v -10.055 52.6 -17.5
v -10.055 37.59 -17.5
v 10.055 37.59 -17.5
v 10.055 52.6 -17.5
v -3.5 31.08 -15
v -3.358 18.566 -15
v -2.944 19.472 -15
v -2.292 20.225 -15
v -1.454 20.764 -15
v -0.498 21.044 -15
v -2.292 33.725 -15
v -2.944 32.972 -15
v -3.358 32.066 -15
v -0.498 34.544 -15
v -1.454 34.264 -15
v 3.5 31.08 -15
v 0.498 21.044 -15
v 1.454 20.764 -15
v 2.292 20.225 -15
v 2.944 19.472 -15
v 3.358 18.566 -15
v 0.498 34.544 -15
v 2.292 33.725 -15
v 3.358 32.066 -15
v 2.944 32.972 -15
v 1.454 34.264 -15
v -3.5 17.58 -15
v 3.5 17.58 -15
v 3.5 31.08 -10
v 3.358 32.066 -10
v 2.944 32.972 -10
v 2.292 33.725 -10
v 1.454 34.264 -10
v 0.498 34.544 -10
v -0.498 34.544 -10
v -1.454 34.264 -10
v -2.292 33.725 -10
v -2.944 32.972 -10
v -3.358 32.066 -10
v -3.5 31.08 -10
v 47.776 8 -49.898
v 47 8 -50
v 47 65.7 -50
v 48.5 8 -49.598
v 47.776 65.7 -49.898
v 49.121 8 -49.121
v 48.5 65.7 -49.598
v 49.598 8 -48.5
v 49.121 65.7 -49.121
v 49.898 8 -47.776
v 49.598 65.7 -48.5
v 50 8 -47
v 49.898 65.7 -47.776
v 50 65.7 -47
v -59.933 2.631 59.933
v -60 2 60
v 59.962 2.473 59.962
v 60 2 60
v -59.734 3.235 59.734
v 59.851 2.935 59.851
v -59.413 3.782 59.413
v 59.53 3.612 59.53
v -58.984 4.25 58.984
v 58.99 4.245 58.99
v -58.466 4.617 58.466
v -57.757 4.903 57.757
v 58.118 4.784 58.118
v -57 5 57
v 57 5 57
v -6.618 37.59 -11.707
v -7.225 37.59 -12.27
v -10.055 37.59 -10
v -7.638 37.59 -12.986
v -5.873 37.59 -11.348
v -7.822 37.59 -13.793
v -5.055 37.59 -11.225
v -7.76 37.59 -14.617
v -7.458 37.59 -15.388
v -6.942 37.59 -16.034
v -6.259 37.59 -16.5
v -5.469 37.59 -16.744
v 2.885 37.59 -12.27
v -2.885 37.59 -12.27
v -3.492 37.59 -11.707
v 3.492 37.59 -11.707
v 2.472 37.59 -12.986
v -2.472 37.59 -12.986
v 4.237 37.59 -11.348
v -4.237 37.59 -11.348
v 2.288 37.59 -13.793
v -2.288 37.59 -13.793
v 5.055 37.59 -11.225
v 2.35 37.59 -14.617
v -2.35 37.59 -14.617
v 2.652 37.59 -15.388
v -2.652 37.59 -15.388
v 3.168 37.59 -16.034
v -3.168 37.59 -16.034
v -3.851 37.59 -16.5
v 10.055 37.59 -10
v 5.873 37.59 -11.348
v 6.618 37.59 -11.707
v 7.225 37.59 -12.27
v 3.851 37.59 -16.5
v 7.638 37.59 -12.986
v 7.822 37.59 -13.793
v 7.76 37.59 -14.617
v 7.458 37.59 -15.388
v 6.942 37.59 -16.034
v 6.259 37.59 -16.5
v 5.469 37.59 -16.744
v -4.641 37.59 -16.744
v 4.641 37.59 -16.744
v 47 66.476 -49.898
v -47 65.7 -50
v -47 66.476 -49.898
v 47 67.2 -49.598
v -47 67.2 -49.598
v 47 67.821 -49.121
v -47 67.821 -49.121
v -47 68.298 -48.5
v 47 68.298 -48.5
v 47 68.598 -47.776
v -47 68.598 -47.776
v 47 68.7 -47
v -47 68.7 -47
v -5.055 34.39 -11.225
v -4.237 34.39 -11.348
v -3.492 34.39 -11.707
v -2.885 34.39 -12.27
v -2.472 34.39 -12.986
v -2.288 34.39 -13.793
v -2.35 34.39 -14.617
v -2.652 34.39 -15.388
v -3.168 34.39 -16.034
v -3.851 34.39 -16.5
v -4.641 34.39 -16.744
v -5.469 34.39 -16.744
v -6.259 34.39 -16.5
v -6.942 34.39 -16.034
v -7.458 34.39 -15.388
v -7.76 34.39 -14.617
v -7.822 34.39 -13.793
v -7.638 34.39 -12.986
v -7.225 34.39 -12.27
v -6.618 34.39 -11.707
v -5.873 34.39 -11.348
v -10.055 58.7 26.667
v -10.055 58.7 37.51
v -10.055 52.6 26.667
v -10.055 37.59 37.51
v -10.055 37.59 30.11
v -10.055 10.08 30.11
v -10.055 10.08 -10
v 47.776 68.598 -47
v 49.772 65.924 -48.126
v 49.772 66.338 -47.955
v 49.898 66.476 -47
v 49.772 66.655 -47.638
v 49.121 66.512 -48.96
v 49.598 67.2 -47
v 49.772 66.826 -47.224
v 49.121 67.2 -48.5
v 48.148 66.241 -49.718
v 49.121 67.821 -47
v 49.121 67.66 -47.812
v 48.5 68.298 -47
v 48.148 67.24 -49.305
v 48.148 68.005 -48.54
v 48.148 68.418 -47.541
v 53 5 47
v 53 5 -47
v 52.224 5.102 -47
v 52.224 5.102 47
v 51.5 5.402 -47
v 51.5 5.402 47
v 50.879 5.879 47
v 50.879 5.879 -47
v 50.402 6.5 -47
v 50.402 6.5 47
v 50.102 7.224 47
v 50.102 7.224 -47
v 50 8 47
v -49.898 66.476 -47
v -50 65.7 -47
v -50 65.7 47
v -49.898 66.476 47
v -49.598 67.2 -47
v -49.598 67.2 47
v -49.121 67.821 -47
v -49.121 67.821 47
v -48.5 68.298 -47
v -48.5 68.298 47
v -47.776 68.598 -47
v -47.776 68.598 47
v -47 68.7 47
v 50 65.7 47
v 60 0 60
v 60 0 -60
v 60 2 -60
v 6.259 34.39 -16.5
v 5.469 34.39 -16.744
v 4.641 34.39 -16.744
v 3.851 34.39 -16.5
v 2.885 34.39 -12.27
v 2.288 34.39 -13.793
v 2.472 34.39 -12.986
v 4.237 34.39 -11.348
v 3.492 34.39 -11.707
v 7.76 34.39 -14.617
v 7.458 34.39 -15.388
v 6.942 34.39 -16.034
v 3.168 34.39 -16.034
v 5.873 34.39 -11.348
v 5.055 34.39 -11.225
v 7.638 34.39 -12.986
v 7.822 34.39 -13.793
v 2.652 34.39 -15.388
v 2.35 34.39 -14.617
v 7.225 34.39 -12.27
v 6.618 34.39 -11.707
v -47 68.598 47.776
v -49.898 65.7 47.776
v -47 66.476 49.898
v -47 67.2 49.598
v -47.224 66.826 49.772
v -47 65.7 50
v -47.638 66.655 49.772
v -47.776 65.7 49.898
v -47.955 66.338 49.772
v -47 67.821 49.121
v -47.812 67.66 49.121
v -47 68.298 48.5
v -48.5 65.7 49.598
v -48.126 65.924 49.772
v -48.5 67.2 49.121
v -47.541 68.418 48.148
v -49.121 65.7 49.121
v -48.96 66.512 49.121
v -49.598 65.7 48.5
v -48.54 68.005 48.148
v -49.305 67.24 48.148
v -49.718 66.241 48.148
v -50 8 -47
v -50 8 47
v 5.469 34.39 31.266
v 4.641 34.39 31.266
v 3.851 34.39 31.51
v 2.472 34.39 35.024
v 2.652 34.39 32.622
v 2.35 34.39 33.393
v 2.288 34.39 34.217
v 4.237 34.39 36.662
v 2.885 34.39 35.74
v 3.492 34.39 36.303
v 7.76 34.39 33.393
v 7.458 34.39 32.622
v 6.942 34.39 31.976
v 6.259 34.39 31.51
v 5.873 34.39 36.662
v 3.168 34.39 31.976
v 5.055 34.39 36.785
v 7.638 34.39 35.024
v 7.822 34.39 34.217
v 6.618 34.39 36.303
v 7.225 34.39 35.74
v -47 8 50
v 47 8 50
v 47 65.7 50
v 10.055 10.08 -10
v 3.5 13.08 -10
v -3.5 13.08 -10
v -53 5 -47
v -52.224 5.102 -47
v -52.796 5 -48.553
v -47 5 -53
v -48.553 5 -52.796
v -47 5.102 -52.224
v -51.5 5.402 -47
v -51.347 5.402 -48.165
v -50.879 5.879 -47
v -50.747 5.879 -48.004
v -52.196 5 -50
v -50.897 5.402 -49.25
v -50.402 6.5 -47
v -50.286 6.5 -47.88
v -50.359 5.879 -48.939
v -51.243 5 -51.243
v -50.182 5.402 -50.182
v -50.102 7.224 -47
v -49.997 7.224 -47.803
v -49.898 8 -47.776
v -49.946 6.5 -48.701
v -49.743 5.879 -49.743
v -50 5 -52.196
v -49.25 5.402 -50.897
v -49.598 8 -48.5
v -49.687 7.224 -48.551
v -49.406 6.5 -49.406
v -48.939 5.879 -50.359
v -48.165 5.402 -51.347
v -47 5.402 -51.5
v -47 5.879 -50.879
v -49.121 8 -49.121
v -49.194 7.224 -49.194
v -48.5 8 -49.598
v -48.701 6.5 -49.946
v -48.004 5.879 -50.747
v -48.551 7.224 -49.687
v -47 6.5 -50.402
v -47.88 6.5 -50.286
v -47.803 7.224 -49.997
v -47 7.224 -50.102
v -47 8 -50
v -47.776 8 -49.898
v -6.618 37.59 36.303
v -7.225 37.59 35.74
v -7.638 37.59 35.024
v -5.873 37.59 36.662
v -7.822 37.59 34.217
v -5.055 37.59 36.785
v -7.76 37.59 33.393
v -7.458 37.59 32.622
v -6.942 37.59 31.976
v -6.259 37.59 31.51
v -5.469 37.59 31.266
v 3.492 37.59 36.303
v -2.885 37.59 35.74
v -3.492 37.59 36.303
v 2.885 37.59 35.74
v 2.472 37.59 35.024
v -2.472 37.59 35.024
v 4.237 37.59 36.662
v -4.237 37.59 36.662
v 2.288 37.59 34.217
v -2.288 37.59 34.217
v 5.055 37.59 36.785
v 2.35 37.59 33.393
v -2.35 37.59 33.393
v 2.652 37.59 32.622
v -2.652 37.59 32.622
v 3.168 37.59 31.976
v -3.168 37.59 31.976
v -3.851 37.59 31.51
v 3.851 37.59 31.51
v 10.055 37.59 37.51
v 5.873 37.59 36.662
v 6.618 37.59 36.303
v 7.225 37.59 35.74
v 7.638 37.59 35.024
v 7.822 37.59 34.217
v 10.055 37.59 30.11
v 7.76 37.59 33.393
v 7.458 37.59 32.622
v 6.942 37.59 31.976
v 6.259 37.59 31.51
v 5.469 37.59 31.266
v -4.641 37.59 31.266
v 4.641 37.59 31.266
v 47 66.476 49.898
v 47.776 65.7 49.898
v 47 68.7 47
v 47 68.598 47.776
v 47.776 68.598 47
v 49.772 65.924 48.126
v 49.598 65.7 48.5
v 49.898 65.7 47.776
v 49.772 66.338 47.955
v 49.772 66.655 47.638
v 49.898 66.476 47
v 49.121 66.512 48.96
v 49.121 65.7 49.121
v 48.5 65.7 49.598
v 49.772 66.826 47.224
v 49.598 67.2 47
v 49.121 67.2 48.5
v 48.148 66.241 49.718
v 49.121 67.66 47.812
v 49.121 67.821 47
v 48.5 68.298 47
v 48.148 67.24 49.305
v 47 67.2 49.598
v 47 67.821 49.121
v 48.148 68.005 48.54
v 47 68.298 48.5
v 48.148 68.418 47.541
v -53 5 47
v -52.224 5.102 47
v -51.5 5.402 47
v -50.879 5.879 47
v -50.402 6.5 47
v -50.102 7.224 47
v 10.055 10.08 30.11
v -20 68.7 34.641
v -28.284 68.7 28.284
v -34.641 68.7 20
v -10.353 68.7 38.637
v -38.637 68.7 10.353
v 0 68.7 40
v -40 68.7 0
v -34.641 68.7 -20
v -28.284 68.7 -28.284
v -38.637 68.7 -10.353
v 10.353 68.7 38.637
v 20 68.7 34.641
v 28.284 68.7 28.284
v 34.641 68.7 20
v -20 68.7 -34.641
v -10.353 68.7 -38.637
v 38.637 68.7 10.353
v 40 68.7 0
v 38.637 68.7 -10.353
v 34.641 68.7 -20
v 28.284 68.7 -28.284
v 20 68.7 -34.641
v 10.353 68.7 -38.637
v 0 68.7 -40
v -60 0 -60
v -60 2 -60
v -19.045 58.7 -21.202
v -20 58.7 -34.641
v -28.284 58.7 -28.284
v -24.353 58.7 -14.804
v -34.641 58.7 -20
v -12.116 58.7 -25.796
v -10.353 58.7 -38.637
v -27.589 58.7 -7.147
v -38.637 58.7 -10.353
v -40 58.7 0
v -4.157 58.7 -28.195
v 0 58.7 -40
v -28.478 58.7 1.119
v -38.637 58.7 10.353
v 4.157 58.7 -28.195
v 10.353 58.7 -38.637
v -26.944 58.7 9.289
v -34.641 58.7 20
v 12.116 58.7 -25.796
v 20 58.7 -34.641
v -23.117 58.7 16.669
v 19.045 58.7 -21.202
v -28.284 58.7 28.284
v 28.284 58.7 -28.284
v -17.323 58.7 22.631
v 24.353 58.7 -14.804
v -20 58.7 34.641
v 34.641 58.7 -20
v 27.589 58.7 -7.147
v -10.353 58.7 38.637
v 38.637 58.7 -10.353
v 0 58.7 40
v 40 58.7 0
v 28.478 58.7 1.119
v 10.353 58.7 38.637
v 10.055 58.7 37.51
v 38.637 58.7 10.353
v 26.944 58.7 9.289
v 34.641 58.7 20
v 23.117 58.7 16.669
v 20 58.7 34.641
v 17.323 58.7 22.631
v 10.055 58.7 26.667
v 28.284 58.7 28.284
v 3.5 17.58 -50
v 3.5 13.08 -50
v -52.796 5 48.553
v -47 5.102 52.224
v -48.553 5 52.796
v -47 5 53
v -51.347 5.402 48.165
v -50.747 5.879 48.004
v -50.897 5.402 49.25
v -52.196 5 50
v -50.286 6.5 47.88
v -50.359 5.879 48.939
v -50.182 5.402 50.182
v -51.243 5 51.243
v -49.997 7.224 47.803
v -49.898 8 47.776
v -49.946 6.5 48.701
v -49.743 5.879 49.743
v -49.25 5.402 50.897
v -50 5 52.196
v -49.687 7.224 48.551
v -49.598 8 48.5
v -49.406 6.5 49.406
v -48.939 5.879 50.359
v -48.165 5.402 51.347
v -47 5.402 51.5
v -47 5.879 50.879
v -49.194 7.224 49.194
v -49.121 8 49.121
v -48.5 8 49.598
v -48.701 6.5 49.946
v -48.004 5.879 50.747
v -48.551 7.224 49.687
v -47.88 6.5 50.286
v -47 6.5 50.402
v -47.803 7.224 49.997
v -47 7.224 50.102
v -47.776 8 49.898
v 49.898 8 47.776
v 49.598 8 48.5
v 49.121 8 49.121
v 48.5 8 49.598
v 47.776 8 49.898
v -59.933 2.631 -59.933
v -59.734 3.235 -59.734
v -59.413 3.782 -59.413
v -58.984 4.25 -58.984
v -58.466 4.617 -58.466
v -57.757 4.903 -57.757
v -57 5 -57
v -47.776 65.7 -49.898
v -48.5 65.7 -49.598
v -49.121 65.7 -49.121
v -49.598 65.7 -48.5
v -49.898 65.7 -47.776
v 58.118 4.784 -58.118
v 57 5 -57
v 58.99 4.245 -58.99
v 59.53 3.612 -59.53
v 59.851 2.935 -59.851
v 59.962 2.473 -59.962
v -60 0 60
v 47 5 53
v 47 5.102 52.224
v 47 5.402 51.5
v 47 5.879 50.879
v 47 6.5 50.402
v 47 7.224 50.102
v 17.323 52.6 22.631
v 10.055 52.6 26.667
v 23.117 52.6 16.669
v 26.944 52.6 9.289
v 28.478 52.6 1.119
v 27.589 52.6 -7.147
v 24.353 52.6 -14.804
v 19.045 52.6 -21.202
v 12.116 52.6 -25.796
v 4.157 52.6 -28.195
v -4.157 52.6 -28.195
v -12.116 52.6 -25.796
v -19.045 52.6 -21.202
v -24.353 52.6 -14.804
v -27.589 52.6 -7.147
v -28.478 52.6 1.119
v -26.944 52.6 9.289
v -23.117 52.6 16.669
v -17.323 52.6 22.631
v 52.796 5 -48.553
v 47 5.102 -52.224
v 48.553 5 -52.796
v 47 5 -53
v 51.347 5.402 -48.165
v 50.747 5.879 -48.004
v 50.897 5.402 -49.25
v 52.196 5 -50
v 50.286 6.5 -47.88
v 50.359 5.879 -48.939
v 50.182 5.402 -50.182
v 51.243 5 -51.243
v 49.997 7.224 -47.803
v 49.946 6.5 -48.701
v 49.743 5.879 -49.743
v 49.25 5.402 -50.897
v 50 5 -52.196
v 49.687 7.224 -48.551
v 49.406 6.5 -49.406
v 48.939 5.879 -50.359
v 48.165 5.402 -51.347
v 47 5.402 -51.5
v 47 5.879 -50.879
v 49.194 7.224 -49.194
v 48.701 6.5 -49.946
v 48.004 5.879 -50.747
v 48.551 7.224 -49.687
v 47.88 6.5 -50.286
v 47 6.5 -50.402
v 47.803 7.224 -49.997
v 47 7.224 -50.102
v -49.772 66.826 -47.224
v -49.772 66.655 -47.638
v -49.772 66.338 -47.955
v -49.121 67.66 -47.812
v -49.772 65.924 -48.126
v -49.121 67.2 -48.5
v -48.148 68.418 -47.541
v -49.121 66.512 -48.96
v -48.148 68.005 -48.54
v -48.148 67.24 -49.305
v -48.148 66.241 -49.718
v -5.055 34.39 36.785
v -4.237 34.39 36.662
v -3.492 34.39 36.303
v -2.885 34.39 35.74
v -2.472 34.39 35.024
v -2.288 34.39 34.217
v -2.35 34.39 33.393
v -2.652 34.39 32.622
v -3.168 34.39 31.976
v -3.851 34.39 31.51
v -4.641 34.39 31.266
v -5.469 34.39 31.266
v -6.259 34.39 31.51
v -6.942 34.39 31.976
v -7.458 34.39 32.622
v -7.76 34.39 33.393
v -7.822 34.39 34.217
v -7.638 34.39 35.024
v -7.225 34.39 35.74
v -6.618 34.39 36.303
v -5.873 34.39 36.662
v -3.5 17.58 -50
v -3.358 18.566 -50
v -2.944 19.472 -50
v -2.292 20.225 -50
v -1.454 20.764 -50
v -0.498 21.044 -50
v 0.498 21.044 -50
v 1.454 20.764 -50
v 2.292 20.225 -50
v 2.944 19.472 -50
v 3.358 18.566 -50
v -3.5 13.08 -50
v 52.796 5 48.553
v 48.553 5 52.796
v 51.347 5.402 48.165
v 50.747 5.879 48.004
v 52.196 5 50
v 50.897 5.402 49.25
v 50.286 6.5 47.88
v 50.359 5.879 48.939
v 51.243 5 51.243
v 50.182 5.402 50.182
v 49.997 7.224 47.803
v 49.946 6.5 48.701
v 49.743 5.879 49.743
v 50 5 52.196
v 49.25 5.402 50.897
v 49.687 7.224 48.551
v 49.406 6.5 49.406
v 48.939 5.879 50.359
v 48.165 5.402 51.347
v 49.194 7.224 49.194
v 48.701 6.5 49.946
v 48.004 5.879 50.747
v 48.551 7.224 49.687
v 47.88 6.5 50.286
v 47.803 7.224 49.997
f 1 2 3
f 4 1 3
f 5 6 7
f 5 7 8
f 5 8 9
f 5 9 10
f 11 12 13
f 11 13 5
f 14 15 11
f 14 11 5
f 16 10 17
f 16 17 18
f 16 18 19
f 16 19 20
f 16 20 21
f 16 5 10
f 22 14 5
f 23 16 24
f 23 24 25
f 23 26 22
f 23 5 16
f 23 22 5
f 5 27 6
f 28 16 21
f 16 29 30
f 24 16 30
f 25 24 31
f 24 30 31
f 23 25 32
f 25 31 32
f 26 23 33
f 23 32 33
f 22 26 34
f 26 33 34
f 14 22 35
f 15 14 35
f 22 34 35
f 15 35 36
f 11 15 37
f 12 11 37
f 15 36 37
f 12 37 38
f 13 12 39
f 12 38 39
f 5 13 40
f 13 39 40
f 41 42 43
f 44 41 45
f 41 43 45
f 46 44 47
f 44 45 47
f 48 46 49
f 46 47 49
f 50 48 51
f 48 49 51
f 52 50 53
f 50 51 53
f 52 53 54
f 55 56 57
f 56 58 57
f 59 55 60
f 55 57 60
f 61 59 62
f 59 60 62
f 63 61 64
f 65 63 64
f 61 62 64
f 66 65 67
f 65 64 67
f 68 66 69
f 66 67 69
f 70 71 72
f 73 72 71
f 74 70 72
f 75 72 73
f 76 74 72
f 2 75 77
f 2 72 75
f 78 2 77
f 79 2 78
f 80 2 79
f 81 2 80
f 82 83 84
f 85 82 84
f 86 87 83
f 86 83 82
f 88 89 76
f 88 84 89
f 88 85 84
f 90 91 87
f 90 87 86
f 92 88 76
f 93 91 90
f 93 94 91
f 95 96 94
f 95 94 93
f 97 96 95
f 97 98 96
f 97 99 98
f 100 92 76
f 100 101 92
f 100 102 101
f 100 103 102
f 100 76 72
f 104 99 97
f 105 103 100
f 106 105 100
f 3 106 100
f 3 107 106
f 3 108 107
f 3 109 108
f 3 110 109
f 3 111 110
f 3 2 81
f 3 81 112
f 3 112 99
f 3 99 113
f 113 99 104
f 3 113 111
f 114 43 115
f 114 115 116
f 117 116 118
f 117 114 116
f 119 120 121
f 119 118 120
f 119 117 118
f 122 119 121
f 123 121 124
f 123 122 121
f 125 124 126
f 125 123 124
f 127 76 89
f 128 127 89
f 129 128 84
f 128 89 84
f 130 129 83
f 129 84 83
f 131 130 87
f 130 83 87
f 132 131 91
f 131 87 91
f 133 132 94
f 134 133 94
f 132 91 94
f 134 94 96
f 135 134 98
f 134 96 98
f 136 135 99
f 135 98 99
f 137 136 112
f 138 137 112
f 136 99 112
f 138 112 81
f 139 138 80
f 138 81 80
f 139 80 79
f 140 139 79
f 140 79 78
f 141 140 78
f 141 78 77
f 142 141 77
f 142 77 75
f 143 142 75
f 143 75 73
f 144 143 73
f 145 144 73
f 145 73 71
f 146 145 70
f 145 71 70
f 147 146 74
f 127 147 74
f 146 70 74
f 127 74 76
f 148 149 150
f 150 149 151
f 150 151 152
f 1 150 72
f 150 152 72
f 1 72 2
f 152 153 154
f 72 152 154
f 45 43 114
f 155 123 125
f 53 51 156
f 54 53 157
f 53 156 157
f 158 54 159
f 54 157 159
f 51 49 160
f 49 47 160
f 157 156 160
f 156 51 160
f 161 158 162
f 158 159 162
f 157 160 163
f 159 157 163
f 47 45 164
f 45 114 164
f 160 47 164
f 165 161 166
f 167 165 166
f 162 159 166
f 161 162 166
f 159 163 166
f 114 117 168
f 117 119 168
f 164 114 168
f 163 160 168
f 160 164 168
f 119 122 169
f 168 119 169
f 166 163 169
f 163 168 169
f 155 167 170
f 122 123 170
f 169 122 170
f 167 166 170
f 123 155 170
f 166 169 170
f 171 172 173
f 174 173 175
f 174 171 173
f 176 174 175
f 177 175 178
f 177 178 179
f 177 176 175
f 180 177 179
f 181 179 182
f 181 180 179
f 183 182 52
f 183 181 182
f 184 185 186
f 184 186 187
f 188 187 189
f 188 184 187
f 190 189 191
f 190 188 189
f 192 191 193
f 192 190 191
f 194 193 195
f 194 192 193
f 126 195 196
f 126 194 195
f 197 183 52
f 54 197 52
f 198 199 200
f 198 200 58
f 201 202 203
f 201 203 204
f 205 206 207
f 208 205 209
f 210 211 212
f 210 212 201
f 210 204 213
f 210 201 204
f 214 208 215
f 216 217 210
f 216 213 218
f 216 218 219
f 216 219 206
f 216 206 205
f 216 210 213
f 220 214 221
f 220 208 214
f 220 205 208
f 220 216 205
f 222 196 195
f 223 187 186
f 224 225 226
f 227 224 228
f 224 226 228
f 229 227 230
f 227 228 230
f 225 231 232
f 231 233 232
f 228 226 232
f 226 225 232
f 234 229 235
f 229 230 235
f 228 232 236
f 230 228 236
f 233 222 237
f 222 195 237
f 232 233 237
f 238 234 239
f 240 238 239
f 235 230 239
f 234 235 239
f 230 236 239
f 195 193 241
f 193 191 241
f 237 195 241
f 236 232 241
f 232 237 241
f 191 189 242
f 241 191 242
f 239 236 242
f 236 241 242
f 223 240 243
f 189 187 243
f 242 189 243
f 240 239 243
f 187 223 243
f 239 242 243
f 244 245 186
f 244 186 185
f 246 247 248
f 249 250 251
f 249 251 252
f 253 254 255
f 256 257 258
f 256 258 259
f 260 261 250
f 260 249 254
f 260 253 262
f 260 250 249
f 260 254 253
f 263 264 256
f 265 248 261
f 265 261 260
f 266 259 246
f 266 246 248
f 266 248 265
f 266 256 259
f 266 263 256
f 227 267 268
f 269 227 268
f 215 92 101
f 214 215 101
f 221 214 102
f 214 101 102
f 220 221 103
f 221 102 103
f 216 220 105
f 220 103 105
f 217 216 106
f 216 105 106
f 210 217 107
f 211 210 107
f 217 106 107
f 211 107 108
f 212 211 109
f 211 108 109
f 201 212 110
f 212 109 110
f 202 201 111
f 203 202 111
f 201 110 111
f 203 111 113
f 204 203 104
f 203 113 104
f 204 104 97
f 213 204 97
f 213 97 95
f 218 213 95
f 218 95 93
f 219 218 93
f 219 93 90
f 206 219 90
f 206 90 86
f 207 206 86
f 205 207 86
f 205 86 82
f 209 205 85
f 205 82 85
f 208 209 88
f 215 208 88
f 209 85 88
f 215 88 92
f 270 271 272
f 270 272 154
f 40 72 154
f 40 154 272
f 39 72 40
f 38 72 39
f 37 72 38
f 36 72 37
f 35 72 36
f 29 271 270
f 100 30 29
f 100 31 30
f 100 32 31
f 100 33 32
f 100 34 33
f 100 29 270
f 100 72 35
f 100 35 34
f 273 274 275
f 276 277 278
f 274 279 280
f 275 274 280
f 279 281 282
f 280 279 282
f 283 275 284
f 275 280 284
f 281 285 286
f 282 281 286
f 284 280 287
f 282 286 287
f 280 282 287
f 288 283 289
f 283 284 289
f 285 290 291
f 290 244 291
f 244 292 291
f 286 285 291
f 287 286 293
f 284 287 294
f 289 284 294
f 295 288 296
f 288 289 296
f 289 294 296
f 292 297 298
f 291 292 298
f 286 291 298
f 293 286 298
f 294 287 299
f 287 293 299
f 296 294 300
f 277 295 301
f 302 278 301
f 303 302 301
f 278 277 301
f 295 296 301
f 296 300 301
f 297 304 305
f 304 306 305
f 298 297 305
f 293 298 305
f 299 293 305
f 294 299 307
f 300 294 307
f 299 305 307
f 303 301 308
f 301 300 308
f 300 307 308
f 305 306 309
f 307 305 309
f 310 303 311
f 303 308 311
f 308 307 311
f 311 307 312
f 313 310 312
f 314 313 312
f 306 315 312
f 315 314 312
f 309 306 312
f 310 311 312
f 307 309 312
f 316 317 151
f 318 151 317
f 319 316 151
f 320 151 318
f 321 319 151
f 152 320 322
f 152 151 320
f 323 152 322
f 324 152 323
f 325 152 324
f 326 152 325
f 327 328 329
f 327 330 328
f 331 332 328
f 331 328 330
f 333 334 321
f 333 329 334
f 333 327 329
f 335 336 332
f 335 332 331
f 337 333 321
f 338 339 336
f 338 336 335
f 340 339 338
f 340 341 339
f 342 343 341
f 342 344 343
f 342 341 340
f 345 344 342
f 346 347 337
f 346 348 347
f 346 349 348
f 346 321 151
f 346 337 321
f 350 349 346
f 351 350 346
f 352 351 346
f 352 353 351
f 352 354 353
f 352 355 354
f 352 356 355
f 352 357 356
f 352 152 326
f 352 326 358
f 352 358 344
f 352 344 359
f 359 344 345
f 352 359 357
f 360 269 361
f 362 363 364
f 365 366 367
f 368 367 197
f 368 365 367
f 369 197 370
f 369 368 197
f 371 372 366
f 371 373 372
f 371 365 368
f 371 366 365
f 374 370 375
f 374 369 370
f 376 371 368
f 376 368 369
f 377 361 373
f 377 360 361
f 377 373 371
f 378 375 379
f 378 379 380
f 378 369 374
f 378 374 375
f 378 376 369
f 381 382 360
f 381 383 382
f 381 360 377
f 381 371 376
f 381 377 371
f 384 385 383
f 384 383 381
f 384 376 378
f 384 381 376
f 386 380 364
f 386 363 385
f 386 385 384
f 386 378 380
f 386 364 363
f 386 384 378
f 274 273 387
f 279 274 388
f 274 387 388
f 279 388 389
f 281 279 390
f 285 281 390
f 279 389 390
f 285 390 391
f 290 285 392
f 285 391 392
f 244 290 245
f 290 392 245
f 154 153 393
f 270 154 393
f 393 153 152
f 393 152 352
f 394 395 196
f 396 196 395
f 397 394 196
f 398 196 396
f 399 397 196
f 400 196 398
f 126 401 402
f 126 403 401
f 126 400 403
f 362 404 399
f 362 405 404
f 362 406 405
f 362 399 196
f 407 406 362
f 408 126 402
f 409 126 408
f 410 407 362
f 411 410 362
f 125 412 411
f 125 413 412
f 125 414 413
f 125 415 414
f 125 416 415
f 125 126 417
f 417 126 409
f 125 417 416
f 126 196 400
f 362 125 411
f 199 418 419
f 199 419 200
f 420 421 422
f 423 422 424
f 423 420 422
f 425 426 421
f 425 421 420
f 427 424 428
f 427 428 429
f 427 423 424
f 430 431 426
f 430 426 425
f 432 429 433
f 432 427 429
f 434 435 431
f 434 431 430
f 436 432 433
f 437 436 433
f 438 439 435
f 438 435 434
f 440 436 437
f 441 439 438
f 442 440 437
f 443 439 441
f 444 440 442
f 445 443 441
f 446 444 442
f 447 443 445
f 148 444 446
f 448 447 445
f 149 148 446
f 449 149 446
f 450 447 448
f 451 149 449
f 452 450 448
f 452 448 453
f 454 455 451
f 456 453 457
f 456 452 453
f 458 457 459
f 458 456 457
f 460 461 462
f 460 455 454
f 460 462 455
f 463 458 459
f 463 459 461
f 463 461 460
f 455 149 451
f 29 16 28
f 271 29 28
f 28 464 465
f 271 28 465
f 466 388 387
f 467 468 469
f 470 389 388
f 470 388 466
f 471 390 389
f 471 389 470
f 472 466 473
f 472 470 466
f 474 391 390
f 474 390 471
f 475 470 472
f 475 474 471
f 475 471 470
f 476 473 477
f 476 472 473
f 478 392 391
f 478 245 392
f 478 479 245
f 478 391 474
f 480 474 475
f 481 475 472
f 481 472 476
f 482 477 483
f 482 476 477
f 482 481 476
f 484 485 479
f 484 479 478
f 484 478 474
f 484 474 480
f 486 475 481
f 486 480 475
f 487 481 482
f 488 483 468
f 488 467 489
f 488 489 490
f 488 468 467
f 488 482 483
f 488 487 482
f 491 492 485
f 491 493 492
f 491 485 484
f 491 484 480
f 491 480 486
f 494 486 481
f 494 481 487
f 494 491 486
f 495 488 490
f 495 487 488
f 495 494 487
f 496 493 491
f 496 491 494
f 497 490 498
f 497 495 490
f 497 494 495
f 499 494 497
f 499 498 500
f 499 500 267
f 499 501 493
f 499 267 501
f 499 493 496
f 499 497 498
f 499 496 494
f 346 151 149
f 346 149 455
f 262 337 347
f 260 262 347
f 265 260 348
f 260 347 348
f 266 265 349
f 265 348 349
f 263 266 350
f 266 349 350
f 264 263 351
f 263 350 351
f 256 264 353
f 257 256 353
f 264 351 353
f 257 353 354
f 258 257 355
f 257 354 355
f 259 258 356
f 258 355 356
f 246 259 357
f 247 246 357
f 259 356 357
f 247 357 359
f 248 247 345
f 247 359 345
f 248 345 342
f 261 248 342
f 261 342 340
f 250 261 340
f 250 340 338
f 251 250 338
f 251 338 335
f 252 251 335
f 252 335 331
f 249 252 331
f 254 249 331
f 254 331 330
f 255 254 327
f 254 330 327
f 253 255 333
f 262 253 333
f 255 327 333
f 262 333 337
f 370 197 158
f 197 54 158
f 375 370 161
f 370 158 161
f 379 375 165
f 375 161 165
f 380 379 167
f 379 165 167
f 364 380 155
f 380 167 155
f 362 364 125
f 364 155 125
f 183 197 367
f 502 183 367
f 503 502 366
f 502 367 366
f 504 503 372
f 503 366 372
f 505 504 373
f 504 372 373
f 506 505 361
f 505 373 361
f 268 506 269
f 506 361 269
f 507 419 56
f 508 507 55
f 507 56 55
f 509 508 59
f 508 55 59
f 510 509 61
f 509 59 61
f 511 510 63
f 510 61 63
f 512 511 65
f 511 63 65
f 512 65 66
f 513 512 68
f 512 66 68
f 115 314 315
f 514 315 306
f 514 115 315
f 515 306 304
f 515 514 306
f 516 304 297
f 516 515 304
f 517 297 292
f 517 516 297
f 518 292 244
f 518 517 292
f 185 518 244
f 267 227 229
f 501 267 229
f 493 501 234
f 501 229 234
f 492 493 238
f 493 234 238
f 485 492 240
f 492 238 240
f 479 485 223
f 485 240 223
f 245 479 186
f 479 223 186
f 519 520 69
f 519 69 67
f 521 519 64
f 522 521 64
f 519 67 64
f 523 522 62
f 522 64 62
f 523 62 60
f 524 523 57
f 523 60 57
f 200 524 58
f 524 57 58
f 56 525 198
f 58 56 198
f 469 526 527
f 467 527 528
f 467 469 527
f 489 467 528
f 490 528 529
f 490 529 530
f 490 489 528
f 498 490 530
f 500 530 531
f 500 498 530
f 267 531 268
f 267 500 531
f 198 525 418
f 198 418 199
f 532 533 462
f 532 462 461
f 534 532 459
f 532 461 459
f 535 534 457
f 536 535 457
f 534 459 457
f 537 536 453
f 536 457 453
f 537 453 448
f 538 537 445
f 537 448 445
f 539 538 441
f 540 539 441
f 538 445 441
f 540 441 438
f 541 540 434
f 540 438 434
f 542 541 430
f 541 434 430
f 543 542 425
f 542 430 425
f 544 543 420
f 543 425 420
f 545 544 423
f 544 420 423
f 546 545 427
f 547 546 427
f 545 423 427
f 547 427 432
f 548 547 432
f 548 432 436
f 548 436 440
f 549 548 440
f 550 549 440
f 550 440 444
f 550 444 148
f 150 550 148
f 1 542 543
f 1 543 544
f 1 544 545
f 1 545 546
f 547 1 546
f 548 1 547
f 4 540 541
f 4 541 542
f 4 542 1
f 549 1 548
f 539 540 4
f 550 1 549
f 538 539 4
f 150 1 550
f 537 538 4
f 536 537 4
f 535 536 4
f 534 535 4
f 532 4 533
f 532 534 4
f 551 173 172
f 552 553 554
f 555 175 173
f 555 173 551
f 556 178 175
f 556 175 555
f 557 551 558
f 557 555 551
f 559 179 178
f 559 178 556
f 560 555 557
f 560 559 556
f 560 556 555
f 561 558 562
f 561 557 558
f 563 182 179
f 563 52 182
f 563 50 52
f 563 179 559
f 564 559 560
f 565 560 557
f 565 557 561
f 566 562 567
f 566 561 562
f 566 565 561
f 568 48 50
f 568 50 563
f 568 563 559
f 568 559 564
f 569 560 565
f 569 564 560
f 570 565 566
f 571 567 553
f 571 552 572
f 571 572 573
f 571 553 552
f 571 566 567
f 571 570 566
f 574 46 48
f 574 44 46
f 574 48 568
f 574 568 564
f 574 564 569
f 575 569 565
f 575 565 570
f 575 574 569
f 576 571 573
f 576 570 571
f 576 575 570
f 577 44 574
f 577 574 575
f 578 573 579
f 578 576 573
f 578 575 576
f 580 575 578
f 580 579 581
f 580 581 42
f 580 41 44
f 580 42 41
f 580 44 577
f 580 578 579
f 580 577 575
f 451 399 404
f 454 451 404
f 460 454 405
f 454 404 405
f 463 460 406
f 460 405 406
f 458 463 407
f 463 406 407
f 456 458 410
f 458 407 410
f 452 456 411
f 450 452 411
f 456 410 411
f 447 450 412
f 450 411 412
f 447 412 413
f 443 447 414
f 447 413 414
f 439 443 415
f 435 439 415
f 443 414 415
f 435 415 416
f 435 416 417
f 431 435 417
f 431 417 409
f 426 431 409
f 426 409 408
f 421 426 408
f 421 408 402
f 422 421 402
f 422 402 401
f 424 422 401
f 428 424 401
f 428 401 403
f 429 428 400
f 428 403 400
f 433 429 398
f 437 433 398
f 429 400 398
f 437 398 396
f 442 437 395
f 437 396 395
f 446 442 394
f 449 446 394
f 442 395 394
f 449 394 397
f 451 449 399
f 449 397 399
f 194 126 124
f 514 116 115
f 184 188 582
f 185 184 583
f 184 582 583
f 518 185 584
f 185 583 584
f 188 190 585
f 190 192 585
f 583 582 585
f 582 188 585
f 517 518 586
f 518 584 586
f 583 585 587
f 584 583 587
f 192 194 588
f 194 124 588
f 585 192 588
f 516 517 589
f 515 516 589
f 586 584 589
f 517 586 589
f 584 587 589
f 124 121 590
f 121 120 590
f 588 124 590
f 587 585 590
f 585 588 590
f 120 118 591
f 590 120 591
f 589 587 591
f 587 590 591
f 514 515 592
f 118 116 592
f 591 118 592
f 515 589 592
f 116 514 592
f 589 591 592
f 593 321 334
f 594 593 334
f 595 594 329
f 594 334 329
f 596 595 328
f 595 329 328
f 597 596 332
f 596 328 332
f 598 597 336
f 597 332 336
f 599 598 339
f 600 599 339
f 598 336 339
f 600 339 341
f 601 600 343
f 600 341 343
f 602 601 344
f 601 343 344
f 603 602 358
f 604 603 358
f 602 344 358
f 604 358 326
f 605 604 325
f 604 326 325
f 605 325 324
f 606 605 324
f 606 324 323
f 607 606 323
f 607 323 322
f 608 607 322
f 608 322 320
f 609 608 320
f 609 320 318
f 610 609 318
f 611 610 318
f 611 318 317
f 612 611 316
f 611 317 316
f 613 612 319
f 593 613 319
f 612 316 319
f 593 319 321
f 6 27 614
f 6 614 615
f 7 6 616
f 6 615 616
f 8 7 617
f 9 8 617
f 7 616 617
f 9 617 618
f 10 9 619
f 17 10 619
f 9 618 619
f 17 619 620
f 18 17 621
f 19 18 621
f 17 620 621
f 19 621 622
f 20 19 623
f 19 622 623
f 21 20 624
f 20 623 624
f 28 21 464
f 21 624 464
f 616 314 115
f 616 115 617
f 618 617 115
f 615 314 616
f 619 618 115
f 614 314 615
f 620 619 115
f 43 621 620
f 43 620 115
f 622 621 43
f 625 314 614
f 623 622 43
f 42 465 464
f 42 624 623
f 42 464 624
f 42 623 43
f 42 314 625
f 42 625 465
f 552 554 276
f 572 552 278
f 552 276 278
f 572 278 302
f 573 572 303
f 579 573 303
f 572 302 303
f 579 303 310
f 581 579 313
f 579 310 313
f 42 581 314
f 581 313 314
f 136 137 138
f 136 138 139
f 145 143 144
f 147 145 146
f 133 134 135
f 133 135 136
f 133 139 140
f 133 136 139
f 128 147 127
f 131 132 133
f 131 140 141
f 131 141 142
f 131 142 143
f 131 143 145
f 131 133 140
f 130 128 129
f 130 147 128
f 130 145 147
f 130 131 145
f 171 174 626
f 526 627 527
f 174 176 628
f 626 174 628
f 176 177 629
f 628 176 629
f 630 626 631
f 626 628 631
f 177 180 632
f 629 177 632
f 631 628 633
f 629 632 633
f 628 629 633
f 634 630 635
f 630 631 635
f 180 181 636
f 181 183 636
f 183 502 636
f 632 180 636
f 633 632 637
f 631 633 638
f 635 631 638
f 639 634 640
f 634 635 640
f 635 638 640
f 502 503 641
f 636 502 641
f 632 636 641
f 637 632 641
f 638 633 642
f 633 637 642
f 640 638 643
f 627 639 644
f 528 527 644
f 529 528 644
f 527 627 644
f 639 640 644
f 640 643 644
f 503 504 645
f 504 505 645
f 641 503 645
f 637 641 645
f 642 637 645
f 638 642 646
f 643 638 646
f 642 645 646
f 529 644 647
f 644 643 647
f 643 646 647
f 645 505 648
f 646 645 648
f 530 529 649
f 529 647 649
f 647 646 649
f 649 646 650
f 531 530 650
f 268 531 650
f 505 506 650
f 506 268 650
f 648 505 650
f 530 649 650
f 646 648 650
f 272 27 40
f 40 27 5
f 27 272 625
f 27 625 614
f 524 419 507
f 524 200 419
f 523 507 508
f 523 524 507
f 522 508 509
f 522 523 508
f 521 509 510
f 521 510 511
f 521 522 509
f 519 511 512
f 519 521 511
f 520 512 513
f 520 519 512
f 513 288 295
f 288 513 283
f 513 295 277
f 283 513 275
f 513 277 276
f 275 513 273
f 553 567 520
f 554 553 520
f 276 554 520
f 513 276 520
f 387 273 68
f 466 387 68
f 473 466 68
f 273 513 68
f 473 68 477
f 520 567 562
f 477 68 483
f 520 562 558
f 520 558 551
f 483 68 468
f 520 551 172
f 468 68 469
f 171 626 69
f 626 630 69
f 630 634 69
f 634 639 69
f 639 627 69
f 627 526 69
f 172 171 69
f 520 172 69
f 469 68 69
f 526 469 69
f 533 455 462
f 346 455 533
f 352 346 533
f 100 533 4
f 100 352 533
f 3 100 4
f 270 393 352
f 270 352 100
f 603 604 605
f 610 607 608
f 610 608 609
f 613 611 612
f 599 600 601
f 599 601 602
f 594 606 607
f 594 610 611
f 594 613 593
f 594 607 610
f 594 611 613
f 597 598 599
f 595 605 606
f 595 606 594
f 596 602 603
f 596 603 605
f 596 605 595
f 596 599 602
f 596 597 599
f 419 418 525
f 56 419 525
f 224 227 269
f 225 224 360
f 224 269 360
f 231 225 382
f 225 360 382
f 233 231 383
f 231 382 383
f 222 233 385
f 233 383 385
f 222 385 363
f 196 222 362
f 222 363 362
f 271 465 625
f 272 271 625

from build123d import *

# Parameters (mm, degrees)
SKETCH1_W               = 100
SKETCH1_H               = 100
BOSS_EXTRUDE1_DEPTH     = 68.7
SKETCH2_R               = 40
CUT_EXTRUDE1_DEPTH      = 10
SKETCH3_R               = 28.5
CUT_EXTRUDE2_DEPTH      = 6.1
CUT_EXTRUDE3_DEPTH      = 89.129223303
CUT_EXTRUDE3_DEPTH_BACK = 15.01
SKETCH4_W               = 20.11
SKETCH4_H               = 55.01
SKETCH5_W               = 20.11
SKETCH5_H               = 40.11
CUT_EXTRUDE4_DEPTH      = 27.51
CUT_EXTRUDE5_REACH      = 133.224
SKETCH7_R               = 2.775
CUT_EXTRUDE6_DEPTH      = 3.2
CUT_EXTRUDE7_DEPTH      = 5
SKETCH9_W               = 120
SKETCH9_H               = 120
BOSS_EXTRUDE2_DEPTH     = 5
FILLET2_R               = 3


with BuildPart() as part:
    # Sketch1 → Boss-Extrude1 (new body)
    with BuildSketch(Plane(origin=(0, 0, 0), x_dir=(1, 0, 0), z_dir=(0, 1, 0))):
        Rectangle(SKETCH1_W, SKETCH1_H)
    extrude(amount=BOSS_EXTRUDE1_DEPTH)

    # Sketch2 → Cut-Extrude1 (cut)
    with BuildSketch(Plane(origin=(0, 68.7, 0), x_dir=(1, 0, 0), z_dir=(0, 1, 0))):
        with Locations(Location((0, 0, 0), (0, 0, 270))):
            Circle(SKETCH2_R)
    extrude(amount=-CUT_EXTRUDE1_DEPTH, mode=Mode.SUBTRACT)

    # Sketch3 → Cut-Extrude2 (cut)
    with BuildSketch(Plane(origin=(0, 58.7, 0), x_dir=(1, 0, 0), z_dir=(0, 1, 0))):
        with Locations(Location((0, 0, 0), (0, 0, 270))):
            Circle(SKETCH3_R)
    extrude(amount=-CUT_EXTRUDE2_DEPTH, mode=Mode.SUBTRACT)

    # Sketch4 → Cut-Extrude3 (cut, two sides: drawn at the far end of the back side and taken through both)
    with BuildSketch(Plane(origin=(0, 52.6, 0), x_dir=(1, 0, 0), z_dir=(0, 1, 0)).offset(-CUT_EXTRUDE3_DEPTH_BACK)):
        with Locations((0, -10.005)):
            Rectangle(SKETCH4_W, SKETCH4_H)
    extrude(amount=CUT_EXTRUDE3_DEPTH + CUT_EXTRUDE3_DEPTH_BACK, mode=Mode.SUBTRACT)

    # Sketch5 → Cut-Extrude4 (cut)
    with BuildSketch(Plane(origin=(0, 37.59, 0), x_dir=(1, 0, 0), z_dir=(0, 1, 0))):
        with Locations((0, -10.055)):
            Rectangle(SKETCH5_W, SKETCH5_H)
    extrude(amount=-CUT_EXTRUDE4_DEPTH, mode=Mode.SUBTRACT)

    # Sketch6 → Cut-Extrude5 (cut, up to next)
    with BuildSketch(Plane(origin=(0, 0, -50), x_dir=(-1, 0, 0), z_dir=(0, 0, -1)), mode=Mode.PRIVATE) as cut_extrude5_sk1:
        with BuildLine():
            Line((-3.5, 13.08), (3.5, 13.08))
            Line((3.5, 13.08), (3.5, 17.58))
            ThreePointArc((3.5, 17.58), (0, 21.08), (-3.5, 17.58))
            Line((-3.5, 17.58), (-3.5, 13.08))
        make_face()
    cut_extrude5_tool1 = extrude(cut_extrude5_sk1.sketch, amount=-CUT_EXTRUDE5_REACH, mode=Mode.PRIVATE) & part.part
    add(cut_extrude5_tool1.solids().sort_by_distance((0, 16.746539, -50))[0], mode=Mode.SUBTRACT)

    # Sketch7 → Cut-Extrude6 (cut)
    with BuildSketch(Plane(origin=(0, 37.59, 0), x_dir=(1, 0, 0), z_dir=(0, 1, 0))):
        with Locations(Location((5.055, -34.01, 0), (0, 0, 270))):
            Circle(SKETCH7_R)
        with Locations(Location((-5.055, -34.01, 0), (0, 0, 270))):
            Circle(SKETCH7_R)
        with Locations(Location((-5.055, 14, 0), (0, 0, 270))):
            Circle(SKETCH7_R)
        with Locations(Location((5.055, 14, 0), (0, 0, 270))):
            Circle(SKETCH7_R)
    extrude(amount=-CUT_EXTRUDE6_DEPTH, mode=Mode.SUBTRACT)

    # Sketch8 → Cut-Extrude7 (cut)
    with BuildSketch(Plane.XY.offset(-10)):
        with BuildLine():
            Line((-3.5, 13.08), (3.5, 13.08))
            Line((3.5, 13.08), (3.5, 31.08))
            ThreePointArc((3.5, 31.08), (0, 34.58), (-3.5, 31.08))
            Line((-3.5, 31.08), (-3.5, 13.08))
        make_face()
    extrude(amount=-CUT_EXTRUDE7_DEPTH, mode=Mode.SUBTRACT)

    # Sketch9 → Boss-Extrude2 (add)
    with BuildSketch(Plane.XZ):
        Rectangle(SKETCH9_W, SKETCH9_H)
    extrude(amount=-BOSS_EXTRUDE2_DEPTH)

    # Fillet2
    fillet2_edges = [part.edges().sort_by_distance(p)[0] for p in [
        (-50, 5, 0),
        (50, 5, 0),
        (0, 5, 50),
        (60, 5, 0),
        (0, 5, -60),
        (-60, 5, 0),
        (0, 5, 60),
        (0, 5, -50),
        (0, 68.7, -50),
        (-50, 68.7, 0),
        (0, 68.7, 50),
        (-50, 36.85, 50),
        (-50, 36.85, -50),
        (50, 36.85, -50),
        (50, 36.85, 50),
        (50, 68.7, 0),
    ]]
    fillet(fillet2_edges, radius=FILLET2_R)


solid = part.part
